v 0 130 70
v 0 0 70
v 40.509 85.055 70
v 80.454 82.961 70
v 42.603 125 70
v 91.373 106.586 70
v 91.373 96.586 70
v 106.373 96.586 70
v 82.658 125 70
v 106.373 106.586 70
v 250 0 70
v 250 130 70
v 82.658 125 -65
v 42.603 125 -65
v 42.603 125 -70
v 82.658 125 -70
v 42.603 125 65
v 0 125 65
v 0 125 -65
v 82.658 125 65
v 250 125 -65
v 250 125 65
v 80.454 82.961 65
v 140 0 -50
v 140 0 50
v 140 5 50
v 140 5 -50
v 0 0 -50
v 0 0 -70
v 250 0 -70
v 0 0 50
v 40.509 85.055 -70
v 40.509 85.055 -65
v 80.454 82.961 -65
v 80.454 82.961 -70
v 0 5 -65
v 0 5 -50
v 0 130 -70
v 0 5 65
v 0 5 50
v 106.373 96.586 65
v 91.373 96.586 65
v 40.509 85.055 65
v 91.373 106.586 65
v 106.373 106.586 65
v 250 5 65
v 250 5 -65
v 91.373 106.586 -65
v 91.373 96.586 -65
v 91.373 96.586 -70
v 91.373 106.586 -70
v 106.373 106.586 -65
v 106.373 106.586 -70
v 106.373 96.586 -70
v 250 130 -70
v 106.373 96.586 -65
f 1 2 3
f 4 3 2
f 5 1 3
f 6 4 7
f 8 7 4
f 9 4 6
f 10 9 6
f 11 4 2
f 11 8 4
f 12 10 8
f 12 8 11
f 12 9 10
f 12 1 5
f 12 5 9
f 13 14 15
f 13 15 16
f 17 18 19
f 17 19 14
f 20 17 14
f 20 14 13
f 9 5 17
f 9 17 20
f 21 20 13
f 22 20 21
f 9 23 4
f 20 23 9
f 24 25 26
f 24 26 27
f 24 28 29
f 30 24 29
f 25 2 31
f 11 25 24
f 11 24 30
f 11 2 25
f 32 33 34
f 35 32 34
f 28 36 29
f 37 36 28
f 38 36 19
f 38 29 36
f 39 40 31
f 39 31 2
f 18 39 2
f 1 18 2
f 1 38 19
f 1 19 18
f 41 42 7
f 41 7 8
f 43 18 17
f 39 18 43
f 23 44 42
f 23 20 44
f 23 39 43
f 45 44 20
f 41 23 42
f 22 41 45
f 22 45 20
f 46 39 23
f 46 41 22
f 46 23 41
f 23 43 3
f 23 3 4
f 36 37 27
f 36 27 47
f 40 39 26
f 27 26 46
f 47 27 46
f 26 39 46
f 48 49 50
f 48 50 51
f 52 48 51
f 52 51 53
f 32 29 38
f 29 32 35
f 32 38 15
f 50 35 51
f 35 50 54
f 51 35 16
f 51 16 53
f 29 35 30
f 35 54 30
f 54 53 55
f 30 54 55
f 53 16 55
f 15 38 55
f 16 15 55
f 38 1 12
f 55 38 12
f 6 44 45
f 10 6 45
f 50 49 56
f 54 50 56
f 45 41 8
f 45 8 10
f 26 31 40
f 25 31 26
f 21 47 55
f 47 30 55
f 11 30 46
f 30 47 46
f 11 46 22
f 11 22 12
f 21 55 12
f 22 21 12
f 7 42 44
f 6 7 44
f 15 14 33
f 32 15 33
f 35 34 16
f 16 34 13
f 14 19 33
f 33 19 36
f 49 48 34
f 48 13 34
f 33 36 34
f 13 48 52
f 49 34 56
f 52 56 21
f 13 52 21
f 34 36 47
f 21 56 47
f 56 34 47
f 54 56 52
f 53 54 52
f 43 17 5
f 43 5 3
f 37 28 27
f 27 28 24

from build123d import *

# Parameters (mm, degrees)
SKETCH_C_W          = 250
SKETCH_C_H          = 70
BOSS_EXTRUDE1_DEPTH = 5
SKETCH2_W           = 250
SKETCH2_H           = 5
BOSS_EXTRUDE2_DEPTH = 120
SKETCH3_W           = 15
SKETCH3_H           = 10
CUT_EXTRUDE1_DEPTH  = 120
SKETCH4_W           = 140
SKETCH4_H           = 50
CUT_EXTRUDE2_DEPTH  = 5
SKETCH5_W           = 250
SKETCH5_H           = 70
BOSS_EXTRUDE3_DEPTH = 5


with BuildPart() as part:
    # Sketch C → Boss-Extrude1 (new body)
    with BuildSketch(Plane(origin=(0, 0, 0), x_dir=(1, 0, 0), z_dir=(0, 1, 0))):
        with Locations((125, 35)):
            Rectangle(SKETCH_C_W, SKETCH_C_H)
    extrude(amount=BOSS_EXTRUDE1_DEPTH)

    # Sketch2 → Boss-Extrude2 (add)
    with BuildSketch(Plane(origin=(0, 5, 0), x_dir=(1, 0, 0), z_dir=(0, 1, 0))):
        with Locations((125, 67.5)):
            Rectangle(SKETCH2_W, SKETCH2_H)
    extrude(amount=BOSS_EXTRUDE2_DEPTH)

    # Sketch3 → Cut-Extrude1 (cut)
    with BuildSketch(Plane.XY.offset(-65)):
        with Locations((98.873250263, 101.586143008)):
            Rectangle(SKETCH3_W, SKETCH3_H)
        Polygon((40.509305923, 85.05481861), (80.454487313, 82.96138036), (82.657638013, 125), (42.602744173, 125), align=None)
    extrude(amount=-CUT_EXTRUDE1_DEPTH, mode=Mode.SUBTRACT)

    # Sketch4 → Cut-Extrude2 (cut)
    with BuildSketch(Plane.XZ):
        with Locations((70, -25)):
            Rectangle(SKETCH4_W, SKETCH4_H)
    extrude(amount=-CUT_EXTRUDE2_DEPTH, mode=Mode.SUBTRACT)

    # Sketch5 → Boss-Extrude3 (add)
    with BuildSketch(Plane(origin=(0, 130, 0), x_dir=(1, 0, 0), z_dir=(0, 1, 0))):
        with Locations((125, 35)):
            Rectangle(SKETCH5_W, SKETCH5_H)
    extrude(amount=-BOSS_EXTRUDE3_DEPTH)

    # Mirror3: part across plane


with BuildPart() as part_1:
    add(part.part)
    add(part.part.mirror(Plane.XY))


solid = part_1.part
